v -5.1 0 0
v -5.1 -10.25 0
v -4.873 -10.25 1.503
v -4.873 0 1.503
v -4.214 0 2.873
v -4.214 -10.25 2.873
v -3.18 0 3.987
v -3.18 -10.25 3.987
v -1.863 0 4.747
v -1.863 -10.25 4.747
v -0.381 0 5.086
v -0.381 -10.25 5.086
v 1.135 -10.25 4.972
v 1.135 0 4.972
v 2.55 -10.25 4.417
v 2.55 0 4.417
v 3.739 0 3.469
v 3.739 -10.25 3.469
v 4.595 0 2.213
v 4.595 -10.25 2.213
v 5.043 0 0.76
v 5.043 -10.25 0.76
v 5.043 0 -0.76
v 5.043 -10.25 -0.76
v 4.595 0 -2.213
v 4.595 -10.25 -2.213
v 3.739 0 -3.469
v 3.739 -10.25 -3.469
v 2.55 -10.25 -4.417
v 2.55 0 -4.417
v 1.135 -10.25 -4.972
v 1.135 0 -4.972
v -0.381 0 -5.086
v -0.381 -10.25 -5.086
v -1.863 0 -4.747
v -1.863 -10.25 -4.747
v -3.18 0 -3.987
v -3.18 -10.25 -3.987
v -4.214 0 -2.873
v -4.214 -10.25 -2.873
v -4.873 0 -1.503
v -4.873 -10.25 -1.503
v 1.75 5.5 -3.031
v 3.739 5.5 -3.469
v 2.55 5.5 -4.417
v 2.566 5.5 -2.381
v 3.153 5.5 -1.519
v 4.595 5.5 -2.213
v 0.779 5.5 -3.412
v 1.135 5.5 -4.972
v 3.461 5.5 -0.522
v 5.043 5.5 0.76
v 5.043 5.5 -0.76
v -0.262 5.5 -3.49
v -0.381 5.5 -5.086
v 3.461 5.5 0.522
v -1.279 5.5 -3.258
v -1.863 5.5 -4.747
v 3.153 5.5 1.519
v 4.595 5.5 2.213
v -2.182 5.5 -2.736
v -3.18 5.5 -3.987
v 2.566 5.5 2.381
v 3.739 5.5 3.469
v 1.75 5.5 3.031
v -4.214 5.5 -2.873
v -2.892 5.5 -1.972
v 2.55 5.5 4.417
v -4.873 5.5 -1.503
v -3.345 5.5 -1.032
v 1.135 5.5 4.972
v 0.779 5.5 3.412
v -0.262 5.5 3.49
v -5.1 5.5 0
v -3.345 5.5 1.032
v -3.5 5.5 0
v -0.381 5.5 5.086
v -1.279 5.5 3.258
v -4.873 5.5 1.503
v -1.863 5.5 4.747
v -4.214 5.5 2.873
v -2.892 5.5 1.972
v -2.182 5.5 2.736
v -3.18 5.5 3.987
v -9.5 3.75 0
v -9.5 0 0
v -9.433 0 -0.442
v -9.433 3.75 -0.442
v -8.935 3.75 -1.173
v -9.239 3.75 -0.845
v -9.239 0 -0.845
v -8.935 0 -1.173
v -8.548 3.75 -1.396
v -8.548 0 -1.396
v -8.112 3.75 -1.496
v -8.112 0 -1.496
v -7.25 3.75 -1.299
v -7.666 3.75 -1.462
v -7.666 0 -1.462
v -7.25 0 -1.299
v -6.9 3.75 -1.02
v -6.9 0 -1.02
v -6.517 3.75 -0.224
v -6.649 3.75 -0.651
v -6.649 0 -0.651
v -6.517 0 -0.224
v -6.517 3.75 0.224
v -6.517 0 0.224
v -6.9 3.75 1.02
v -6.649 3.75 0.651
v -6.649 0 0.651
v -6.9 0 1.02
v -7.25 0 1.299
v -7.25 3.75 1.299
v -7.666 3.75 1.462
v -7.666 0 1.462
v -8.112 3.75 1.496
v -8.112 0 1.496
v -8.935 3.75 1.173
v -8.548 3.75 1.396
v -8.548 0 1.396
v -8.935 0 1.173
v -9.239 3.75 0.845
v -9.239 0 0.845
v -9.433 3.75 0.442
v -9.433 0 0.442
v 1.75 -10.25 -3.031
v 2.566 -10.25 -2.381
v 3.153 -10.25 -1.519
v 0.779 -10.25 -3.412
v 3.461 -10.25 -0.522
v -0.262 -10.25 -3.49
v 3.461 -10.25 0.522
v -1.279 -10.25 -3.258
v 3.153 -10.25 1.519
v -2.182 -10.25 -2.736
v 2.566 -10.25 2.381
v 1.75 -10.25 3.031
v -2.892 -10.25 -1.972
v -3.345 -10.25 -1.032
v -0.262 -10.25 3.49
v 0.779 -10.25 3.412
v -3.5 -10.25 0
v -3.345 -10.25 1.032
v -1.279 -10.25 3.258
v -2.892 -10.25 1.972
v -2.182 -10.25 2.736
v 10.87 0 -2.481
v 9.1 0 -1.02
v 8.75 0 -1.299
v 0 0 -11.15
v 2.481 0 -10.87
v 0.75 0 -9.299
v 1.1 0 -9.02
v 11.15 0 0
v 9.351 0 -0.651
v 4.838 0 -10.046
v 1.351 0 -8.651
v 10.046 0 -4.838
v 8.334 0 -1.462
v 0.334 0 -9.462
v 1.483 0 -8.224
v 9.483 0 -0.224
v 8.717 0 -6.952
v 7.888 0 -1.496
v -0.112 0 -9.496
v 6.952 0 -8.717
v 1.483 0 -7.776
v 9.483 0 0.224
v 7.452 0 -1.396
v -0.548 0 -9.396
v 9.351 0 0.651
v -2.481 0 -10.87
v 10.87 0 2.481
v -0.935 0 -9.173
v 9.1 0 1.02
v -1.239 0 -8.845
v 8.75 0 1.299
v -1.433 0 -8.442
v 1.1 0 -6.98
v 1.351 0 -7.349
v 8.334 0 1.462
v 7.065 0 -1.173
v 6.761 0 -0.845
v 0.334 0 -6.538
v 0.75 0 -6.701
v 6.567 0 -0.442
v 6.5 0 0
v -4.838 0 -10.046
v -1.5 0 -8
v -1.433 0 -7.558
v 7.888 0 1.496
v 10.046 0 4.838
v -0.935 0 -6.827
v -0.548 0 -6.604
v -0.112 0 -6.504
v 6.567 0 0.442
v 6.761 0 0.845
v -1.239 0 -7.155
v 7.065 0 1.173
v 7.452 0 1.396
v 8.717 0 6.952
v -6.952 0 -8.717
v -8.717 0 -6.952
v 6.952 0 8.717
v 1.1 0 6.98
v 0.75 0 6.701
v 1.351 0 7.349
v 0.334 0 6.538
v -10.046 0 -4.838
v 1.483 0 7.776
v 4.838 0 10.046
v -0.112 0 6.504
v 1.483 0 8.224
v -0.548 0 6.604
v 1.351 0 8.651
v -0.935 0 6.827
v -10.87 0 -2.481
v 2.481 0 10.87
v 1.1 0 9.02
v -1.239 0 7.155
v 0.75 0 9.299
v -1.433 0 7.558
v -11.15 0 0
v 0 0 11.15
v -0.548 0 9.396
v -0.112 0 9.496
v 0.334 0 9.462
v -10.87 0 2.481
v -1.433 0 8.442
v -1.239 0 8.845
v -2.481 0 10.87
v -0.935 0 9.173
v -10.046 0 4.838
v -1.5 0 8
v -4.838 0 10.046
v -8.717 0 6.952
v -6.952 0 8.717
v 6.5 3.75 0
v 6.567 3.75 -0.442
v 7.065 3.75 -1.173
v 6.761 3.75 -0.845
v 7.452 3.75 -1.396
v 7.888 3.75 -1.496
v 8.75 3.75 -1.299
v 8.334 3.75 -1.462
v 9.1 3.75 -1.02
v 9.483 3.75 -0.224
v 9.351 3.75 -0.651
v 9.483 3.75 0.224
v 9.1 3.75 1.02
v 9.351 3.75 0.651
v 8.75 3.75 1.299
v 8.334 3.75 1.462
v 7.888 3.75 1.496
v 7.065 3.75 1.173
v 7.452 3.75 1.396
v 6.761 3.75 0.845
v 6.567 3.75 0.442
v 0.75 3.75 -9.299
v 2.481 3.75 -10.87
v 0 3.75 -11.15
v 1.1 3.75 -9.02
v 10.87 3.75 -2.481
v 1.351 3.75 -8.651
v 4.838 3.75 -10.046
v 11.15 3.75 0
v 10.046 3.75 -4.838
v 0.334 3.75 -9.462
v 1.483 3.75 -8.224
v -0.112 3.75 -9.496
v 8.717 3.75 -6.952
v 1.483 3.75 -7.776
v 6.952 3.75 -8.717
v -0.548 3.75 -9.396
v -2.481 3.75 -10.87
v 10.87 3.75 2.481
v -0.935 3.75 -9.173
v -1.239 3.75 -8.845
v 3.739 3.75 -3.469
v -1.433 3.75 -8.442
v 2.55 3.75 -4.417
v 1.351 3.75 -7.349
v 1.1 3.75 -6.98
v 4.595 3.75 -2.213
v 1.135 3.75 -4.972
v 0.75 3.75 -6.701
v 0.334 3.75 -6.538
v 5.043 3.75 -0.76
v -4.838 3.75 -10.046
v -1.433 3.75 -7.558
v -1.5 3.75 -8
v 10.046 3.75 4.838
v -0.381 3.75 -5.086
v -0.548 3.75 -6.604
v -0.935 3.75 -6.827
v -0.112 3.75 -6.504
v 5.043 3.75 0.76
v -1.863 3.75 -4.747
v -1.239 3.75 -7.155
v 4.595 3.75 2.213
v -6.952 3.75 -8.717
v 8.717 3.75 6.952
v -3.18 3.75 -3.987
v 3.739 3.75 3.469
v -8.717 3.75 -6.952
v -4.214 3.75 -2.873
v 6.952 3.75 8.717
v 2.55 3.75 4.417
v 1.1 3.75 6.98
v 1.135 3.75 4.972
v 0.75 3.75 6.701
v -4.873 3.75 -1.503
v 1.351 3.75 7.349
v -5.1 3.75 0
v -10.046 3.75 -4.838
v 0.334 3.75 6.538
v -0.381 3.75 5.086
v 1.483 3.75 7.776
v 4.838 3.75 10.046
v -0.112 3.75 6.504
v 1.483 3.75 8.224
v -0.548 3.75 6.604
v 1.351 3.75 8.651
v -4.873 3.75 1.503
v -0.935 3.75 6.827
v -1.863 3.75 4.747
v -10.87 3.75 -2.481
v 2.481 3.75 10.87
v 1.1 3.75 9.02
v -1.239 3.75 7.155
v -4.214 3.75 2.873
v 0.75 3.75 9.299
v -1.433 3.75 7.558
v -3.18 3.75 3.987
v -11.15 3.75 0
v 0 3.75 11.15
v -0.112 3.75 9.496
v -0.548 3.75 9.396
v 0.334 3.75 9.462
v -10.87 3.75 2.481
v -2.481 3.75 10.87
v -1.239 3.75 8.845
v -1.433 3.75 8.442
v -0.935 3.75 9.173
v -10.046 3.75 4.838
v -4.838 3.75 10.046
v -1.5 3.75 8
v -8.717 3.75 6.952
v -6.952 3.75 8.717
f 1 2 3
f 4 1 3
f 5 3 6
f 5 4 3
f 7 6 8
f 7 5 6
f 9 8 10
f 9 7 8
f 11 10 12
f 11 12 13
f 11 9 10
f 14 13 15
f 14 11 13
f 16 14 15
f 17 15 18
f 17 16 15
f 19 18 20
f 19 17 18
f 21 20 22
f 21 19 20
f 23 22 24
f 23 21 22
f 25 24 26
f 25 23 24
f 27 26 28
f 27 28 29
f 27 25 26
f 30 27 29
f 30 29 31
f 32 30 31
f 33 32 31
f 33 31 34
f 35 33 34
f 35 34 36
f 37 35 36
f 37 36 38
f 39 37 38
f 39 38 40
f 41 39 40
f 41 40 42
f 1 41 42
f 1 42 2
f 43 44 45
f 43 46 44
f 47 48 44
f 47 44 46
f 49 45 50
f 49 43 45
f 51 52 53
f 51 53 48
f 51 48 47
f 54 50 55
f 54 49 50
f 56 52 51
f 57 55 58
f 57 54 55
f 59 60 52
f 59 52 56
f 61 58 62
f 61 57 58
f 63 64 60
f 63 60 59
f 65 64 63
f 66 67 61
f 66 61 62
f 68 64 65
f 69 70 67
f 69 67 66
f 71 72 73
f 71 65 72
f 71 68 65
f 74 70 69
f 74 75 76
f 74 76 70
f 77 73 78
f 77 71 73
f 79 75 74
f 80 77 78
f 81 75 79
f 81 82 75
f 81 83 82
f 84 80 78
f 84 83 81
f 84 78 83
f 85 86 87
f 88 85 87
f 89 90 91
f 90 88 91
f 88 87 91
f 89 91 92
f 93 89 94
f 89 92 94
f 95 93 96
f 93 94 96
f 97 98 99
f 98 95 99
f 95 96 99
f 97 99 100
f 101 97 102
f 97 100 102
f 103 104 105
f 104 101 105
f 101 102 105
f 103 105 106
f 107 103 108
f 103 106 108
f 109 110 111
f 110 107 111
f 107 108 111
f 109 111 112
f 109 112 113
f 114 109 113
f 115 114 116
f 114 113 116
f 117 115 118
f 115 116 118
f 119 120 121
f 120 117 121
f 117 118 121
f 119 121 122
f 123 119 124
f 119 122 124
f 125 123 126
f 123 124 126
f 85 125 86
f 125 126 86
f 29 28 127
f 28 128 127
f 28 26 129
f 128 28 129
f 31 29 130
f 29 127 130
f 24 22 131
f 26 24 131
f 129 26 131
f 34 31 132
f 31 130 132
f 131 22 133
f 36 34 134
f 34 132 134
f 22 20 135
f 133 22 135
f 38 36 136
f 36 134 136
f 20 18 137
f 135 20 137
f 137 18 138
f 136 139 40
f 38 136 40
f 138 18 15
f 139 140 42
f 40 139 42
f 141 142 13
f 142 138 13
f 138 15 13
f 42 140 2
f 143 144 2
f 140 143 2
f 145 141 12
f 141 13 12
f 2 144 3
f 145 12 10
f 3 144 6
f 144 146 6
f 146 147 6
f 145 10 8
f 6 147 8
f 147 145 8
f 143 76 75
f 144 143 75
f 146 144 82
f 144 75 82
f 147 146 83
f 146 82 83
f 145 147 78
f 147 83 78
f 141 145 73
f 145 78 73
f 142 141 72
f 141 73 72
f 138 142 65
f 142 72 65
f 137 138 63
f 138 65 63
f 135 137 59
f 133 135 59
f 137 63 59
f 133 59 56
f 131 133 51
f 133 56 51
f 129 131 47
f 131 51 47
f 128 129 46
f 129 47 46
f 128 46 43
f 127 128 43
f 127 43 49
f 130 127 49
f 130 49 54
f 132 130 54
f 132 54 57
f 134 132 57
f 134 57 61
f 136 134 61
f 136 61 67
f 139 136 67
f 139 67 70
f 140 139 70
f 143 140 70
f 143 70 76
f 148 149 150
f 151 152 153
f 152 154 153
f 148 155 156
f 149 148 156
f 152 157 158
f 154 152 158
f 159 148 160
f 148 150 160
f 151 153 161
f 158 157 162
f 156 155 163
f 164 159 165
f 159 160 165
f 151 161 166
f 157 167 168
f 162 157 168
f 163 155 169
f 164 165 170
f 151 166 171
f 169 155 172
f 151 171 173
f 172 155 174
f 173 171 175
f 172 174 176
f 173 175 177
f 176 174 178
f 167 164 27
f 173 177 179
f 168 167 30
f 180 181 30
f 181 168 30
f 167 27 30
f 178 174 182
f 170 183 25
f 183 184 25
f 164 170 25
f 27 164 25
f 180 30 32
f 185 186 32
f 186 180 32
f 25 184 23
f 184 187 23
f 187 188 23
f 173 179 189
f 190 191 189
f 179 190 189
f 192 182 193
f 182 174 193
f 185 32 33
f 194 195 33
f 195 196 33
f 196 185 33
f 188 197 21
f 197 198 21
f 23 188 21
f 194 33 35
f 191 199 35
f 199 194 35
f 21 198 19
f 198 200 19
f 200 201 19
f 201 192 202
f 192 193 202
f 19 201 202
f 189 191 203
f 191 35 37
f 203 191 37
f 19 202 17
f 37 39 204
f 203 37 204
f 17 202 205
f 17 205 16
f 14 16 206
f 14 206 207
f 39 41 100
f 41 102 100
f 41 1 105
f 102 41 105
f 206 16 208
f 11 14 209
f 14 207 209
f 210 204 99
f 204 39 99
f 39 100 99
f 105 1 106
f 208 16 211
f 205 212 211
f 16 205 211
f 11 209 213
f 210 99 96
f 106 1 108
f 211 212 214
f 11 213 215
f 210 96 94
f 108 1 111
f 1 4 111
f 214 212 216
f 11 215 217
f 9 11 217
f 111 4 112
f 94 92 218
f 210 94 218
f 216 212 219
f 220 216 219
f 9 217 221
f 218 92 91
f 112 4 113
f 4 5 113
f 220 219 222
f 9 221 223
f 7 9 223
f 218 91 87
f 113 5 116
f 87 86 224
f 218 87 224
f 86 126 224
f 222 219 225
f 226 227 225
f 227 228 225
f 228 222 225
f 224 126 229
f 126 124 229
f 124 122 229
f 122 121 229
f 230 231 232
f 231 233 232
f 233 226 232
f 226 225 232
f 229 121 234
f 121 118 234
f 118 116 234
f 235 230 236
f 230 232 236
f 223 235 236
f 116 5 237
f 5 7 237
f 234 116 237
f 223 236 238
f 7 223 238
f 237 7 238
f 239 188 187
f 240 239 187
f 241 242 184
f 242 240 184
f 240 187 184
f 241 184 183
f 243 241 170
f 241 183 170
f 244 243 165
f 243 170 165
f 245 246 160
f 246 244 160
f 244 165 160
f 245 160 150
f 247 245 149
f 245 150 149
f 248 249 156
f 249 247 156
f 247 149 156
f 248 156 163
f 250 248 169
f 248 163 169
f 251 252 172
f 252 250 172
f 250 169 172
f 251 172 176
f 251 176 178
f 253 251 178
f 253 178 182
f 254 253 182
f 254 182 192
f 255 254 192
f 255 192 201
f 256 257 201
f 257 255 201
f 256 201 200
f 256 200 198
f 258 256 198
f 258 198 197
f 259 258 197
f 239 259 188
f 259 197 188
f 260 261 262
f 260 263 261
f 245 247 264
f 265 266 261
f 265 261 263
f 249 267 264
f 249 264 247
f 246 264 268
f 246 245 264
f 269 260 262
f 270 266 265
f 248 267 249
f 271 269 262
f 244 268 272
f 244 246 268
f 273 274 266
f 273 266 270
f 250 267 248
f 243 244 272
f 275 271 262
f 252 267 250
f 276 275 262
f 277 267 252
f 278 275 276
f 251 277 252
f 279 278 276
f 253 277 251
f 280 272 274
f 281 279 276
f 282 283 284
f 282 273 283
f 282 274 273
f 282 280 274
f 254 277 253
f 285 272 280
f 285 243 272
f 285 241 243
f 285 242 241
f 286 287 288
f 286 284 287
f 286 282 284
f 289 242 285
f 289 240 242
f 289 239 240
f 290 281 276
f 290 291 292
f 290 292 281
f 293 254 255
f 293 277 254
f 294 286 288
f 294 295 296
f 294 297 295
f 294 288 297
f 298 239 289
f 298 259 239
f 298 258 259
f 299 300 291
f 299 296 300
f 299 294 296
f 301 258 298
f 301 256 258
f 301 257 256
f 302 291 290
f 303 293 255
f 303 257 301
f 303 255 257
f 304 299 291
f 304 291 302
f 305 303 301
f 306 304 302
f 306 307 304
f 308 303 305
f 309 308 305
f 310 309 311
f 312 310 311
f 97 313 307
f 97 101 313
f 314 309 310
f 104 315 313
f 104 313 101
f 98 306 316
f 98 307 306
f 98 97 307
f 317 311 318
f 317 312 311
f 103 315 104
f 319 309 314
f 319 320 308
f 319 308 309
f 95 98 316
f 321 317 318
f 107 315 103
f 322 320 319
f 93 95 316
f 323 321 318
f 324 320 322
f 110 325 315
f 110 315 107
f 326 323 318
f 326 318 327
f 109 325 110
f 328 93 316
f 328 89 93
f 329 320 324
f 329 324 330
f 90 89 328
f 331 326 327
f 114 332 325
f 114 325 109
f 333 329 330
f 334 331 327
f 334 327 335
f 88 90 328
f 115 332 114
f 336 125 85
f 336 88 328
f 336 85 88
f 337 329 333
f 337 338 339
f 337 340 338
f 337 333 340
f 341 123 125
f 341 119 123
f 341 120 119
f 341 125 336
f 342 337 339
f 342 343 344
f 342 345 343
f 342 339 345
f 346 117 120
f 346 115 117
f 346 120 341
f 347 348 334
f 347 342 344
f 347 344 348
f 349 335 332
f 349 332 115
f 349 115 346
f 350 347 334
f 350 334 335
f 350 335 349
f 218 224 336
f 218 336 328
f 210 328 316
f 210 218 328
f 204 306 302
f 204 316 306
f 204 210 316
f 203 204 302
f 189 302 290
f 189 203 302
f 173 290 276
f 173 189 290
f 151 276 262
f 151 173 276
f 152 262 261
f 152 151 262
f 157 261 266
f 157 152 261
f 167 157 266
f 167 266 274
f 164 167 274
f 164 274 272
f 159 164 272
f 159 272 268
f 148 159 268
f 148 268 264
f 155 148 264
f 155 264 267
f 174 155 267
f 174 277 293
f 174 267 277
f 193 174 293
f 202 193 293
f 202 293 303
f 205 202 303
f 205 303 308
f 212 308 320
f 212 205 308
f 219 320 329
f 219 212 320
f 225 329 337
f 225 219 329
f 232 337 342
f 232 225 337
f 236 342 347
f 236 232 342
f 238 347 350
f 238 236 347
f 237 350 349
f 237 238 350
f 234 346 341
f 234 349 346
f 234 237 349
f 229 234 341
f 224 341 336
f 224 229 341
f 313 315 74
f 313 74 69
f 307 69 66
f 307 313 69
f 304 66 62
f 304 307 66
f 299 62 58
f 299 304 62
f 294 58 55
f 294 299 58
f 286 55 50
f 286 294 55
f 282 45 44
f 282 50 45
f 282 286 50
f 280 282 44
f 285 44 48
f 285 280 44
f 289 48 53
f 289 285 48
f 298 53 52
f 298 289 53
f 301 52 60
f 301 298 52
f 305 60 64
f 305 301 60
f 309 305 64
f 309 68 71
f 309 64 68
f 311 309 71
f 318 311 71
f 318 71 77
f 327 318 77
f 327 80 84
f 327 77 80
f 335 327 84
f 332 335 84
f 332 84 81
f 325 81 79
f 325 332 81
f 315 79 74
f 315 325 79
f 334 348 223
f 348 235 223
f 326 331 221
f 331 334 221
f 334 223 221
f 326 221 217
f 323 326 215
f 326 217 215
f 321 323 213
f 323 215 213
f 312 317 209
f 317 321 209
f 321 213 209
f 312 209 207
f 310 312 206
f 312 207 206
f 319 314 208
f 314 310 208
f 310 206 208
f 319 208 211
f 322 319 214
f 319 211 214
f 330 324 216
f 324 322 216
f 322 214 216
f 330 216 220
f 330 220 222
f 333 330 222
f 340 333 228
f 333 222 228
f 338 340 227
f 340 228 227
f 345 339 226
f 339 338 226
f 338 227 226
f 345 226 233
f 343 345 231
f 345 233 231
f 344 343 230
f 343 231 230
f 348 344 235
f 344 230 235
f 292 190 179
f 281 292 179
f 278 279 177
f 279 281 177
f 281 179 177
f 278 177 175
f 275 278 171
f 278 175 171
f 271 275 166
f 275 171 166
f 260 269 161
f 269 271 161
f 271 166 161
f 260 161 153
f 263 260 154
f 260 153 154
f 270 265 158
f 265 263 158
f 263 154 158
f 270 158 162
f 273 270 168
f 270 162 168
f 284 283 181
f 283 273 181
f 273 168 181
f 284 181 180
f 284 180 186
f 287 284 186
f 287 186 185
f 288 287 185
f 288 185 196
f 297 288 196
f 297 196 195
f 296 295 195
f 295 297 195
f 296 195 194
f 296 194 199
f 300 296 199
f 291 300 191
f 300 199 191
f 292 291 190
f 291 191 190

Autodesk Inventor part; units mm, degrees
ref_plane "YZ Plane" through (0, 0, 0) normal (1, 0, 0) x (0, 1, 0)
ref_plane "XZ Plane" through (0, 0, 0) normal (0, 1, 0) x (-1, 0, 0)
ref_plane "XY Plane" through (0, 0, 0) normal (0, 0, 1) x (1, 0, 0)
sketch "Sketch1" plane through (0, 0, 0) normal (0, 1, 0) x (-1, 0, 0)
  circle A0 centre (0, 0) radius 11.15
  circle A1 centre (0, 0) radius 3.5
  circle A2 centre (8, 0) radius 1.5
  line L0 (8, 0) -> (0, 0) construction
  circle A3 centre (0, 8) radius 1.5
  circle A4 centre (-8, 0) radius 1.5
  circle A5 centre (0, -8) radius 1.5
  circle A6 centre (0, 0) radius 5.1
  dimension "d0" = 22.3
  dimension "d1" = 7
  dimension "d2" = 3
  dimension "d3" = 8
  dimension "d6" = 360
  dimension "d8" = 10.2
extrude "Extrusion1" add sketch "Sketch1" along normal blind 3.75 contours A0 | A6
extrude "Extrusion2" add sketch "Sketch1" along normal blind 1.75 from surface at 3.75 contours A6
extrude "Extrusion3" add sketch "Sketch1" against normal blind 10.25 contours A6
properties part number "Leadscrew"
